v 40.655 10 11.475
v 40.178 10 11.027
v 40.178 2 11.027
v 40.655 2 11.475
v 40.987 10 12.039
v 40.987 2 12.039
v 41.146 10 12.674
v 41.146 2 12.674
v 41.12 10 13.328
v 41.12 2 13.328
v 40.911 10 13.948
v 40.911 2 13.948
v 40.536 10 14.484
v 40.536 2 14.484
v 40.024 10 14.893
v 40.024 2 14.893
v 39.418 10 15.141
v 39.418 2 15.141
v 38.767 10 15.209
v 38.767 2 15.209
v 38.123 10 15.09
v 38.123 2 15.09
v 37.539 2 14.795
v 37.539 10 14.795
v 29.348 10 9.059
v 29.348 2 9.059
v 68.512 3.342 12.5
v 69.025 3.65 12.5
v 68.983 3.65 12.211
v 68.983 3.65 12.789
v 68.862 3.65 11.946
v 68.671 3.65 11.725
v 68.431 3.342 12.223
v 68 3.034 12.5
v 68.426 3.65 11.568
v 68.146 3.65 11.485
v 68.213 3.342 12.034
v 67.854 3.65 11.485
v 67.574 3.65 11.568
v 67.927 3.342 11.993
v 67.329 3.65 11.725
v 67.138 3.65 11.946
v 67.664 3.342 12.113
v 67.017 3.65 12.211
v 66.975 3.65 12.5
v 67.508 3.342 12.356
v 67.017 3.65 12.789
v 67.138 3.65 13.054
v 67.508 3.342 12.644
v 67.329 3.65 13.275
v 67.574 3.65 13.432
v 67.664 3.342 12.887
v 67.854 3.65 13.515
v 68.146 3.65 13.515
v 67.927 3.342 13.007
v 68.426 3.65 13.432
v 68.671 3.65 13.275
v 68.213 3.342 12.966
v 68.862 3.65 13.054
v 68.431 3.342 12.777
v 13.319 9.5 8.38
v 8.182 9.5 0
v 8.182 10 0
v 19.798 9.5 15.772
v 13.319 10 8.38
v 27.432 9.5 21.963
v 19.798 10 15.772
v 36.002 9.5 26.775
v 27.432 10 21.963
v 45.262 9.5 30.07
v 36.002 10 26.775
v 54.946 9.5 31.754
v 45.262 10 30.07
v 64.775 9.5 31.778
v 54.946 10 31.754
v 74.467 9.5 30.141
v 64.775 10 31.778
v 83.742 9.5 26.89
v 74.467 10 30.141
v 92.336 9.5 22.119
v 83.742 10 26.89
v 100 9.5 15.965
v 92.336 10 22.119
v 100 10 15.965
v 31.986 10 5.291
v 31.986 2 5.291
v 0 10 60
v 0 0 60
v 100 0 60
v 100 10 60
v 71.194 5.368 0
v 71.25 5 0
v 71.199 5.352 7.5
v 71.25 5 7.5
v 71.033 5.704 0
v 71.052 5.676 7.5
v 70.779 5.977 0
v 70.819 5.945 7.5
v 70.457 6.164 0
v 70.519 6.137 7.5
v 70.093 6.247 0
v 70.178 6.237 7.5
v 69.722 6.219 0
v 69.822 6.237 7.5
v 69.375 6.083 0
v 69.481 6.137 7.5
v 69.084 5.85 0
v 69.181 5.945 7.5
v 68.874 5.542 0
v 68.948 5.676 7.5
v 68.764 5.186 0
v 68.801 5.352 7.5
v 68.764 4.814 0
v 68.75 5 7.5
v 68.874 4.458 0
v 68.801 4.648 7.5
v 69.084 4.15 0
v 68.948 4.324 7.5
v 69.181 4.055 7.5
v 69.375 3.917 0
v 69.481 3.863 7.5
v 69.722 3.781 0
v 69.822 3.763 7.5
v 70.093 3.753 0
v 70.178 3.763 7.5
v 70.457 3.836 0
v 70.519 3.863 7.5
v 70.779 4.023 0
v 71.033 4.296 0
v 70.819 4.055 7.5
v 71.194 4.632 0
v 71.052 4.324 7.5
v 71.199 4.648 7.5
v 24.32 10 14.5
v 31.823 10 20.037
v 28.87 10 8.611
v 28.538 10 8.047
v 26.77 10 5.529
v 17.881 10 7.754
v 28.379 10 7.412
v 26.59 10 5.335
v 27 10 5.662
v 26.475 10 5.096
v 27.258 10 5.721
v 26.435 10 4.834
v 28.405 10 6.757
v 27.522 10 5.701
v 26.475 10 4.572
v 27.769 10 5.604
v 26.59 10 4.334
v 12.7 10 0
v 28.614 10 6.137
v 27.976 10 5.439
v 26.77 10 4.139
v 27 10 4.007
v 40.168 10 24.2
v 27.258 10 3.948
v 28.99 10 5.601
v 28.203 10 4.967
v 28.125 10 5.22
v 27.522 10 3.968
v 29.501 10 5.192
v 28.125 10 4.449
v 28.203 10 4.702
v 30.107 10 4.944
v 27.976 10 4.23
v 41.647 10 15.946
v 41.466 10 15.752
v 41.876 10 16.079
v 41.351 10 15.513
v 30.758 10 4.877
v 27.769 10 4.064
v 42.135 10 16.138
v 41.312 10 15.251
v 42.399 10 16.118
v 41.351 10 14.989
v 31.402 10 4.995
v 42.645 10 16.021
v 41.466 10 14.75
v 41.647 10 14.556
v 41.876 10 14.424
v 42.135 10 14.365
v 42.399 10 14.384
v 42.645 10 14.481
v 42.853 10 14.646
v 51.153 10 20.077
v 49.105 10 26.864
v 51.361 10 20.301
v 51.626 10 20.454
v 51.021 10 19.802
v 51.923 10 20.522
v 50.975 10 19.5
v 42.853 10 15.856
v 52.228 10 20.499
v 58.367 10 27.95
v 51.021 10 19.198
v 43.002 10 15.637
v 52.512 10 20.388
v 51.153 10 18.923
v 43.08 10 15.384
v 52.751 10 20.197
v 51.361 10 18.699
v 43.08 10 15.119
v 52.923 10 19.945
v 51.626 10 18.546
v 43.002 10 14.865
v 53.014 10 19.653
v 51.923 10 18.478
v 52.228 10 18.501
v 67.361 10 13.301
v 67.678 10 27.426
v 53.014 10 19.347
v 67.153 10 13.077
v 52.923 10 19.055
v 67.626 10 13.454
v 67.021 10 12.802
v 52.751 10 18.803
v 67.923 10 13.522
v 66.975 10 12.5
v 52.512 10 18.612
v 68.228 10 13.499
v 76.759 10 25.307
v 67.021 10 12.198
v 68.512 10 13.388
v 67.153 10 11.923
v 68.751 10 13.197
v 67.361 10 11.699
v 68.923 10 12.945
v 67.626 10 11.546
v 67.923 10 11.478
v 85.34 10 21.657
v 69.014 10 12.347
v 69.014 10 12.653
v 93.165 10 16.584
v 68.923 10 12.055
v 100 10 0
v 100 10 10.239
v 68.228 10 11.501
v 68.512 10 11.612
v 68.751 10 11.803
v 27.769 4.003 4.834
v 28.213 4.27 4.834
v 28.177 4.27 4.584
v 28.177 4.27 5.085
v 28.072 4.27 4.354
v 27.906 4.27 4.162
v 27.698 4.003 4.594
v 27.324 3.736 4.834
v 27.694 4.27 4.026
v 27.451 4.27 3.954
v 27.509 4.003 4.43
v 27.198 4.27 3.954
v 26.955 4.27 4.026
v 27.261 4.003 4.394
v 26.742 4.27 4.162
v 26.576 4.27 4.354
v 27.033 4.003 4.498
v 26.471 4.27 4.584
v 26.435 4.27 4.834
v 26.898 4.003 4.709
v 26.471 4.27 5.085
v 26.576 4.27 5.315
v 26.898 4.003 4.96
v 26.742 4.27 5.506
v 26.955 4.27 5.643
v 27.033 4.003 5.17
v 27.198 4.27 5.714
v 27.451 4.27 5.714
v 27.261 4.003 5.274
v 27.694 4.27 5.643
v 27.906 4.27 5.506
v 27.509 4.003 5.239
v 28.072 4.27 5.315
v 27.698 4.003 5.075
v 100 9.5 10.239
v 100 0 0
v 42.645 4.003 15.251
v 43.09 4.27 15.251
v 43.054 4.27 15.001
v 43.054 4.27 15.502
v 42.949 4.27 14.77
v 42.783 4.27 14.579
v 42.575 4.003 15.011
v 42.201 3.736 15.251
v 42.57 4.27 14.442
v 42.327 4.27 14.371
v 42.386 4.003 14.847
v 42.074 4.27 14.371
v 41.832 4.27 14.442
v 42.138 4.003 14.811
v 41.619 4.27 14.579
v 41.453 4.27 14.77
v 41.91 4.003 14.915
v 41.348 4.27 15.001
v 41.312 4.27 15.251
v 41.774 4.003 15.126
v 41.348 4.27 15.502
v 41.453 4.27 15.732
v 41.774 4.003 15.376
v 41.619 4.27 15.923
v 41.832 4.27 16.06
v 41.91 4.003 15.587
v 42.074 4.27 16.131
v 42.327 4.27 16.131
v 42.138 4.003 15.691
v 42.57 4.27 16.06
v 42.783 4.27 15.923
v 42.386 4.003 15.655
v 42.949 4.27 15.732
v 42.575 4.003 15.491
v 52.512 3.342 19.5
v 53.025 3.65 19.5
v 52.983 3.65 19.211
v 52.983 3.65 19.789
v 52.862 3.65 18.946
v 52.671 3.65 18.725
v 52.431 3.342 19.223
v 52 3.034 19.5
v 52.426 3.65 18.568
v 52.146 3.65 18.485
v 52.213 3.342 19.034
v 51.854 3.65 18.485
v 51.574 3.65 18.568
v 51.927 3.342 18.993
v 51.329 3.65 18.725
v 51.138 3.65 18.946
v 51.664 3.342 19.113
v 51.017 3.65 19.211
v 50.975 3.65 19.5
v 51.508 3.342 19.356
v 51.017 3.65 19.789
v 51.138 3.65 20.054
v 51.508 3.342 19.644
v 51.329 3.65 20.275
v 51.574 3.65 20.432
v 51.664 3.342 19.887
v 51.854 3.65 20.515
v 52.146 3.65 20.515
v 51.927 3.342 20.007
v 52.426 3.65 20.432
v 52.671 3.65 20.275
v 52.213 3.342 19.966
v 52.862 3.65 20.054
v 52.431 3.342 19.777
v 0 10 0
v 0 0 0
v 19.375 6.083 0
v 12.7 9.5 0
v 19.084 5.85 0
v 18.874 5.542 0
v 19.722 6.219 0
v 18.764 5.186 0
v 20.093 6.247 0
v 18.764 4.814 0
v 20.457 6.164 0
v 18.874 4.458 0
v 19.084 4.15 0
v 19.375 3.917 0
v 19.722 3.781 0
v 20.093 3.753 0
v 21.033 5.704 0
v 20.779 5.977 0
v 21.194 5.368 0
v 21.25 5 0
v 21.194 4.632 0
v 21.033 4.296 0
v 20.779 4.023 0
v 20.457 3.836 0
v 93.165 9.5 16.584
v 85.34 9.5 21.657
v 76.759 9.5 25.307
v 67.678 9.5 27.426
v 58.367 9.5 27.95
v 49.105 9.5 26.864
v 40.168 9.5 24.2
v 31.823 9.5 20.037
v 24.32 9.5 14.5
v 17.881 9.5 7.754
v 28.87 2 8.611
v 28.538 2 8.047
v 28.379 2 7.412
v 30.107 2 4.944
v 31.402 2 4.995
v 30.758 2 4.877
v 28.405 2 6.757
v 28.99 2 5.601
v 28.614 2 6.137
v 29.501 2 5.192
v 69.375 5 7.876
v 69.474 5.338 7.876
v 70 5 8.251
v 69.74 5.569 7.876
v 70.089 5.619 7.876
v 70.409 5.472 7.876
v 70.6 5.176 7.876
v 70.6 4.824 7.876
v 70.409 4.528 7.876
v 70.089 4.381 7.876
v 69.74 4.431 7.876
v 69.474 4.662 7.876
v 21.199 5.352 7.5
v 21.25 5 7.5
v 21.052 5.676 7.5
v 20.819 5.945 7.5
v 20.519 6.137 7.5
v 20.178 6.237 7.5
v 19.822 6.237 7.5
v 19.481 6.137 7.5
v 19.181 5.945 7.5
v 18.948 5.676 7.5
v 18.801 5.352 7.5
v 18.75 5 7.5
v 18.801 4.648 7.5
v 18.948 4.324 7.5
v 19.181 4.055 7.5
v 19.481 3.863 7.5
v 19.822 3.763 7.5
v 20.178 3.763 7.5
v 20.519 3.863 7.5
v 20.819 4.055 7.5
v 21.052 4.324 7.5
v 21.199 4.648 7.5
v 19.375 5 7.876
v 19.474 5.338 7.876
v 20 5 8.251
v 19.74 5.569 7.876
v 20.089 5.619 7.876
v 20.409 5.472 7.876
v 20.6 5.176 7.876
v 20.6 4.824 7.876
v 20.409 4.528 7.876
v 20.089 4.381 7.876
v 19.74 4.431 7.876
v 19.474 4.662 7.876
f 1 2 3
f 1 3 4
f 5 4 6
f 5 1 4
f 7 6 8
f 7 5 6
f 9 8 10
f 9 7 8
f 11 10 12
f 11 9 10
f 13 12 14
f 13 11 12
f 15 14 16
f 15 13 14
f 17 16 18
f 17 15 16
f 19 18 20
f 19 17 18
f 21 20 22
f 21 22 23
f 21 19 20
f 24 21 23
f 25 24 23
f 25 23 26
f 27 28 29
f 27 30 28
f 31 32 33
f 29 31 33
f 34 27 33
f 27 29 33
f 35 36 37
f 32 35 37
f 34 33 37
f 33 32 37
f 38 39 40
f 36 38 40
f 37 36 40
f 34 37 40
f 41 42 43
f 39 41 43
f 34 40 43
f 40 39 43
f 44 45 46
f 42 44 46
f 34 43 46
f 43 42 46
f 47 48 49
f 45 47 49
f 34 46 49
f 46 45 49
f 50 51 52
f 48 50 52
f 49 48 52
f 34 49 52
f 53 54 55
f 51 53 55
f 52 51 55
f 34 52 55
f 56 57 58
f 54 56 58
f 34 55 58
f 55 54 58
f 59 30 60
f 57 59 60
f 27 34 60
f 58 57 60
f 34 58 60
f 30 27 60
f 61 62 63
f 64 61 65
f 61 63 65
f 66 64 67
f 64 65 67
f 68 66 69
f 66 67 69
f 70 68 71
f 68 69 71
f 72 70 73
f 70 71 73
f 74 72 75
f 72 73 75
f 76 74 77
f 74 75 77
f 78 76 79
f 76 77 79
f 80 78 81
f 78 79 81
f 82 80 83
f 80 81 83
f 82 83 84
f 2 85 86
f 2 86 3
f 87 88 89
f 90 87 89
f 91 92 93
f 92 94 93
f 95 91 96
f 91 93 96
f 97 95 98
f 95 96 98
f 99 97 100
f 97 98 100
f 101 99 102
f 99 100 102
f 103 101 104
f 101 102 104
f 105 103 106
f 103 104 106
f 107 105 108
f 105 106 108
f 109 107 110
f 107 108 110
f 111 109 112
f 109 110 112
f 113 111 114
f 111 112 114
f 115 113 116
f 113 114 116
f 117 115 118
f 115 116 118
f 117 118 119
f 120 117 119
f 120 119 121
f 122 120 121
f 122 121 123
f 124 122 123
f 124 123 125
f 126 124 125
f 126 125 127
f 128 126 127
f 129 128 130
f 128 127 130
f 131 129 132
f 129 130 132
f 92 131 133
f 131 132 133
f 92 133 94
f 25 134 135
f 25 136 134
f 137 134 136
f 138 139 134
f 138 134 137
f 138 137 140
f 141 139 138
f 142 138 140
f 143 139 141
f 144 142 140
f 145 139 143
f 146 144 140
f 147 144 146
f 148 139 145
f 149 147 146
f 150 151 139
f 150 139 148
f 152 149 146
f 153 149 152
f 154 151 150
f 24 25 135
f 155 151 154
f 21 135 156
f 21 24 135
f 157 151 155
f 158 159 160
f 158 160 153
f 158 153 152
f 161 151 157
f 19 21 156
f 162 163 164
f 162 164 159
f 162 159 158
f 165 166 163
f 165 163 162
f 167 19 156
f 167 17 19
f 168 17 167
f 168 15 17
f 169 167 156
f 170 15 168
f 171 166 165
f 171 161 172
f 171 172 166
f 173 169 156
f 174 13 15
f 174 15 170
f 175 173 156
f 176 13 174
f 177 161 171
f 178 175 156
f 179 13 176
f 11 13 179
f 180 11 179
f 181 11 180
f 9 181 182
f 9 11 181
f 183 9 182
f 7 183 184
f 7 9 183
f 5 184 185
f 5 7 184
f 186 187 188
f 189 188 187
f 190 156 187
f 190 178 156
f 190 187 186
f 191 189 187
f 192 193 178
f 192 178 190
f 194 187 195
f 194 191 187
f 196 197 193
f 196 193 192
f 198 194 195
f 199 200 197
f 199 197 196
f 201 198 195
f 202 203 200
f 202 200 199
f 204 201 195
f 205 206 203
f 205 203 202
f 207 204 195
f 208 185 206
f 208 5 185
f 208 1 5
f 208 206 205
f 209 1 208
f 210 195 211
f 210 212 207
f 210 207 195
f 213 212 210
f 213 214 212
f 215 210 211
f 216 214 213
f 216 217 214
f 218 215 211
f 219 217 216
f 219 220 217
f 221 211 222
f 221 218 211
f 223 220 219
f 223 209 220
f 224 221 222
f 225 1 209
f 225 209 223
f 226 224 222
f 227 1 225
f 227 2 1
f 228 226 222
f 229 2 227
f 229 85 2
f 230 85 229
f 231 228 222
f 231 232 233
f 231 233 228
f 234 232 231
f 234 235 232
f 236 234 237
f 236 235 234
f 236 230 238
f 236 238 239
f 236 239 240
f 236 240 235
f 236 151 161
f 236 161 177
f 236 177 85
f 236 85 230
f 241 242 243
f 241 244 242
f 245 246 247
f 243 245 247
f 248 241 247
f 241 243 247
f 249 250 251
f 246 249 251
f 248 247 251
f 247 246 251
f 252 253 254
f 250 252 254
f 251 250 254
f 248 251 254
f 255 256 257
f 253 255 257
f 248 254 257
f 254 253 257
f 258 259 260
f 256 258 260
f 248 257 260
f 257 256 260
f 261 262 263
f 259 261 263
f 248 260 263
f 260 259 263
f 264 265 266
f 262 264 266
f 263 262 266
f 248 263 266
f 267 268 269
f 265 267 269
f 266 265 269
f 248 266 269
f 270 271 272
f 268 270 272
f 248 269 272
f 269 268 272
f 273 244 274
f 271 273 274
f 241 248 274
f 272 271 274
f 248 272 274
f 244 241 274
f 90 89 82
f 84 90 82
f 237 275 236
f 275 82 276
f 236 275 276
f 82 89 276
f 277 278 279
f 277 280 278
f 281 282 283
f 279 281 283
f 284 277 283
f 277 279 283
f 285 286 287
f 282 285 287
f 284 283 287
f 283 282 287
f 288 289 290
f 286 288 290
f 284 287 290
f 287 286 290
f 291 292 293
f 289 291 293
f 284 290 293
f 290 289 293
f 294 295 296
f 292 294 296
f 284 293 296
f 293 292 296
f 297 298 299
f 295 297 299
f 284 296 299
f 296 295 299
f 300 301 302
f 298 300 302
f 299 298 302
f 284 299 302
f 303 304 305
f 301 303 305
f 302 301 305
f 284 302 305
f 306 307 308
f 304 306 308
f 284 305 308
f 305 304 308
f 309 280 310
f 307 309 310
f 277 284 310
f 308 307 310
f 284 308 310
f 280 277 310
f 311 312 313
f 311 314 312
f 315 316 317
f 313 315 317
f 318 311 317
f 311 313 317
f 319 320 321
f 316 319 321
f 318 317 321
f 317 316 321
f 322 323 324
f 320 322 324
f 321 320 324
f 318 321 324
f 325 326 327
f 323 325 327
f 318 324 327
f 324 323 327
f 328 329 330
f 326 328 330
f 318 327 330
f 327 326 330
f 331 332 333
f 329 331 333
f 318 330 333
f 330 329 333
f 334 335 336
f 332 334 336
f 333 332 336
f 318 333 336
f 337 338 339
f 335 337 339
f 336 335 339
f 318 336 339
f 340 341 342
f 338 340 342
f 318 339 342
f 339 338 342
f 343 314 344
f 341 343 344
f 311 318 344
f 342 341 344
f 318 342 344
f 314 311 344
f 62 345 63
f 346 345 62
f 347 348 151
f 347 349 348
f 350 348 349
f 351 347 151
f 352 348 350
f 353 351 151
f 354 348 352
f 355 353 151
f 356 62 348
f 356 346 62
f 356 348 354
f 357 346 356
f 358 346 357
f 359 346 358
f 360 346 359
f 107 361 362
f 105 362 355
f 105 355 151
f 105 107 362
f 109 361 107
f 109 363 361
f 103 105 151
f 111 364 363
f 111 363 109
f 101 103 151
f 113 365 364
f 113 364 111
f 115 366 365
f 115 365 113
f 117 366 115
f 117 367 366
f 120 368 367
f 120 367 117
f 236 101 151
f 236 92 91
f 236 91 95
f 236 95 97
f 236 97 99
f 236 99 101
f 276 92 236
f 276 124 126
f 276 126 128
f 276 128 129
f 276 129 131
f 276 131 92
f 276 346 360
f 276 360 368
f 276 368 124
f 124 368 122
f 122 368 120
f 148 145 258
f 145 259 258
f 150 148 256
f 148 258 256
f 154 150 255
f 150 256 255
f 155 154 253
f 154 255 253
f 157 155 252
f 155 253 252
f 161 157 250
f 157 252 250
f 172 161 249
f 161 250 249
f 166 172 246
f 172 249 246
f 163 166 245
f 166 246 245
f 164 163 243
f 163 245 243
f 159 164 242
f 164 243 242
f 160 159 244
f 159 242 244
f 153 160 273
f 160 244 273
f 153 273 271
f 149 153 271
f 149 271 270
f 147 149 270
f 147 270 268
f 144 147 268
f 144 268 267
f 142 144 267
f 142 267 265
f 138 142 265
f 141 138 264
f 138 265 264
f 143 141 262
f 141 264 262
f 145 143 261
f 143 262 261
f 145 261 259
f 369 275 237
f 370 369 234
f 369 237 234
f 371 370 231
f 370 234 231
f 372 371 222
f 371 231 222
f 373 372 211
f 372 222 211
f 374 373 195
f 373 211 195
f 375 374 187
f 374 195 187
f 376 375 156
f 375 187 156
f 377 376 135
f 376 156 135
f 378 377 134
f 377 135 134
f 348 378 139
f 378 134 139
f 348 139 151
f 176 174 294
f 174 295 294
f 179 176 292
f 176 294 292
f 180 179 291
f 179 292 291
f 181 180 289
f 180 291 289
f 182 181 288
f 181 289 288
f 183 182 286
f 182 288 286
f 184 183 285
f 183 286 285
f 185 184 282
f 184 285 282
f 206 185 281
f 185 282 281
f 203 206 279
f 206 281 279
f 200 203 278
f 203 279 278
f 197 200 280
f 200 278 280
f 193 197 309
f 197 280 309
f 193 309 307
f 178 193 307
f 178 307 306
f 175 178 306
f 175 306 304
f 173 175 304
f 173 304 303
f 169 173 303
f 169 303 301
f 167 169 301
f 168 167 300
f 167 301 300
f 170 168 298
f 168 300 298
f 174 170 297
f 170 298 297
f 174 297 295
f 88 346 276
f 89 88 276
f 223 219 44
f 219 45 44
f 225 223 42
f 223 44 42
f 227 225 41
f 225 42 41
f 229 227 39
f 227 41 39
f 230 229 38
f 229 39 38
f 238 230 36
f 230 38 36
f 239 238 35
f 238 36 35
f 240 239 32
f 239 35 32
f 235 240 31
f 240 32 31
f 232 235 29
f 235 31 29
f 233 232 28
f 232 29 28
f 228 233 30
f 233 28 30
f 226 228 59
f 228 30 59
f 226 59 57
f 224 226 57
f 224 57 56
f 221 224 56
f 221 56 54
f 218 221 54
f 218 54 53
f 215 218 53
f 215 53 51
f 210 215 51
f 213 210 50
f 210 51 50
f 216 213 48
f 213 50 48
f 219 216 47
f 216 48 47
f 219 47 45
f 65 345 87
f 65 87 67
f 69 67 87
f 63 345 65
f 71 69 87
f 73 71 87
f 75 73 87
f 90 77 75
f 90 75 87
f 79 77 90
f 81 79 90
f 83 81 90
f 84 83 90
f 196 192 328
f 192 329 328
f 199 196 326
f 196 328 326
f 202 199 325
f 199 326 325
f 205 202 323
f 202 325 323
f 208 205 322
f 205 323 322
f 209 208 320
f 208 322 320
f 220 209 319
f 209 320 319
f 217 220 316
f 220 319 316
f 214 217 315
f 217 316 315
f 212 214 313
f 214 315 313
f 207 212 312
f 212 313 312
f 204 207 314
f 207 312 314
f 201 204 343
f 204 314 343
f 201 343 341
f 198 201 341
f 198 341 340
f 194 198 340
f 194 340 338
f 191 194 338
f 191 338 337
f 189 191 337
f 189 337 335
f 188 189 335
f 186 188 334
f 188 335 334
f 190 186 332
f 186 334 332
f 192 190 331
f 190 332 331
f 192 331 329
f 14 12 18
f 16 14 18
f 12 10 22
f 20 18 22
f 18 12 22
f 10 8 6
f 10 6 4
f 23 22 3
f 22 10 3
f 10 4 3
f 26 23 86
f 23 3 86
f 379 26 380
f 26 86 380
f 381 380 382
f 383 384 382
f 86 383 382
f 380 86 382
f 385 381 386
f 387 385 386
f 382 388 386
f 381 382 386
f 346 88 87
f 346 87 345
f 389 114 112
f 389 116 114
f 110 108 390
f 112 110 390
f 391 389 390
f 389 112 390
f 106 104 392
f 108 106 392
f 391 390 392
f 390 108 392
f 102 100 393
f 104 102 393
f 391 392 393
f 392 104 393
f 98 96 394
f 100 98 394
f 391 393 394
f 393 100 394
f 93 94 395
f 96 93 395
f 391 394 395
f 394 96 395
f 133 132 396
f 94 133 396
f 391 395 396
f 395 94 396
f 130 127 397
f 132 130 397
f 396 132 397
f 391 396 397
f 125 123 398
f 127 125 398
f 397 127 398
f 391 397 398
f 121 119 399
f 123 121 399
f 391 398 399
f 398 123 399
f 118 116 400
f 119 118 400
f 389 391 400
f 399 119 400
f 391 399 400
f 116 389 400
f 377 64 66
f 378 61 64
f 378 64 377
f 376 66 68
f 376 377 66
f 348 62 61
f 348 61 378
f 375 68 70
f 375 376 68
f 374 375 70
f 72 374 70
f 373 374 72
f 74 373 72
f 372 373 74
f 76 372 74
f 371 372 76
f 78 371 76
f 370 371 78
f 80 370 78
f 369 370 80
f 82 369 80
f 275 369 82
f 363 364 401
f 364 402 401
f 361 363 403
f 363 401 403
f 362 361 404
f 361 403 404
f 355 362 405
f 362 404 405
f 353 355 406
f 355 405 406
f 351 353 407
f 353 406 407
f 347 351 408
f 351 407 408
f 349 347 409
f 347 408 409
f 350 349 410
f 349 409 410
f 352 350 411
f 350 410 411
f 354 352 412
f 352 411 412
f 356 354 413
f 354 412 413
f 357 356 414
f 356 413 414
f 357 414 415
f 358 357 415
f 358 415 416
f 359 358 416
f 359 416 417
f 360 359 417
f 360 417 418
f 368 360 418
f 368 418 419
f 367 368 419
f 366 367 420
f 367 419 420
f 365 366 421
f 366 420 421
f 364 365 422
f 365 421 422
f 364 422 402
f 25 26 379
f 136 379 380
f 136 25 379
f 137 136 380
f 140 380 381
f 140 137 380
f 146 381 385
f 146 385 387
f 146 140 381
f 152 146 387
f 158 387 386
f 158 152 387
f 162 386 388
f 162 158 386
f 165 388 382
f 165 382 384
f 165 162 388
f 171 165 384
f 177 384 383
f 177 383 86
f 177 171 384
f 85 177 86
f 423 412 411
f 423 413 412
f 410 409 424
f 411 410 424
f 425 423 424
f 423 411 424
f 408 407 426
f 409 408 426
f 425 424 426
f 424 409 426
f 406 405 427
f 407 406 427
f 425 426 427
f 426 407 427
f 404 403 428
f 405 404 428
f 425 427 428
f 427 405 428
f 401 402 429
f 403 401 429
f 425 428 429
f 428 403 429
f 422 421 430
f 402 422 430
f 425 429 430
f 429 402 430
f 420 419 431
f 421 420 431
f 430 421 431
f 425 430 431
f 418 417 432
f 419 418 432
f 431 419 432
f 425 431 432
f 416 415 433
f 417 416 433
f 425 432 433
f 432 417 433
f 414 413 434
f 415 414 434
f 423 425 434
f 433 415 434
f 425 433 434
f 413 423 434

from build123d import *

# Parameters (mm, degrees)
SKETCH1_W                    = 100
SKETCH1_H                    = 60
BOSS_EXTRUDE1_DEPTH          = 10
M2_5X0_45_TAPPED_HOLE1_D     = 2.05
M2_5X0_45_TAPPED_HOLE1_DEPTH = 6.35
M2_5X0_45_TAPPED_HOLE1_TIP   = 0.615882135
F_2_56_TAPPED_HOLE1_D        = 1.778
F_2_56_TAPPED_HOLE1_DEPTH    = 5.73
F_2_56_TAPPED_HOLE1_TIP      = 0.53416509
CUT_EXTRUDE2_DEPTH           = 8
M3X0_5_TAPPED_HOLE2_D        = 2.5
M3X0_5_TAPPED_HOLE2_DEPTH    = 7.5
M3X0_5_TAPPED_HOLE2_TIP      = 0.751075774
CUT_EXTRUDE3_DEPTH           = 0.5


with BuildPart() as part:
    # Sketch1 → Boss-Extrude1 (new body)
    with BuildSketch(Plane(origin=(0, 0, 0), x_dir=(1, 0, 0), z_dir=(0, 1, 0))):
        with Locations((50, -30)):
            Rectangle(SKETCH1_W, SKETCH1_H)
    extrude(amount=BOSS_EXTRUDE1_DEPTH)

    # M2.5x0.45 Tapped Hole1
    with Locations(Plane(origin=(0, 10, 0), x_dir=(1, 0, 0), z_dir=(0, 1, 0))):
        with Locations((52, -19.5), (68, -12.5)):
            Hole(M2_5X0_45_TAPPED_HOLE1_D / 2, depth=M2_5X0_45_TAPPED_HOLE1_DEPTH)
            with Locations((0, 0, -(M2_5X0_45_TAPPED_HOLE1_DEPTH + M2_5X0_45_TAPPED_HOLE1_TIP / 2))):  # 118° drill point
                Cone(0, M2_5X0_45_TAPPED_HOLE1_D / 2, M2_5X0_45_TAPPED_HOLE1_TIP, mode=Mode.SUBTRACT)

    # #2-56 Tapped Hole1
    with Locations(Plane(origin=(0, 10, 0), x_dir=(1, 0, 0), z_dir=(0, 1, 0))):
        with Locations((42.200946939, -15.251050779), (27.324326662, -4.834329118)):
            Hole(F_2_56_TAPPED_HOLE1_D / 2, depth=F_2_56_TAPPED_HOLE1_DEPTH)
            with Locations((0, 0, -(F_2_56_TAPPED_HOLE1_DEPTH + F_2_56_TAPPED_HOLE1_TIP / 2))):  # 118° drill point
                Cone(0, F_2_56_TAPPED_HOLE1_D / 2, F_2_56_TAPPED_HOLE1_TIP, mode=Mode.SUBTRACT)

    # Sketch6 → Cut-Extrude2 (cut)
    with BuildSketch(Plane(origin=(0, 10, 0), x_dir=(1, 0, 0), z_dir=(0, 1, 0))):
        with BuildLine():
            Line((37.539171218, -14.794621832), (29.347650776, -9.058857469))
            ThreePointArc((29.347650776, -9.058857469), (28.782826877, -5.855581963), (31.986102383, -5.290758065))
            Line((31.986102383, -5.290758065), (40.177622826, -11.026522429))
            ThreePointArc((40.177622826, -11.026522429), (40.742446724, -14.229797934), (37.539171218, -14.794621832))
        make_face()
    extrude(amount=-CUT_EXTRUDE2_DEPTH, mode=Mode.SUBTRACT)

    # M3x0.5 Tapped Hole2
    with Locations(Plane(origin=(0, 0, 0), x_dir=(-1, 0, 0), z_dir=(0, 0, -1))):
        with Locations((-20, 5), (-70, 5)):
            Hole(M3X0_5_TAPPED_HOLE2_D / 2, depth=M3X0_5_TAPPED_HOLE2_DEPTH)
            with Locations((0, 0, -(M3X0_5_TAPPED_HOLE2_DEPTH + M3X0_5_TAPPED_HOLE2_TIP / 2))):  # 118° drill point
                Cone(0, M3X0_5_TAPPED_HOLE2_D / 2, M3X0_5_TAPPED_HOLE2_TIP, mode=Mode.SUBTRACT)

    # Sketch12 → Cut-Extrude3 (cut)
    with BuildSketch(Plane(origin=(0, 10, 0), x_dir=(1, 0, 0), z_dir=(0, 1, 0))):
        with BuildLine():
            ThreePointArc((100, -10.239489856), (52.707108631, -27.480037028), (11.757236622, 1.793876671))
            ThreePointArc((11.757236622, 1.793876671), (9.072701681, 2.684534941), (8.182043412, 0))
            ThreePointArc((8.182043412, 0), (52.166644241, -31.443356122), (102.96433534, -12.925139868))
            ThreePointArc((102.96433534, -12.925139868), (102.824992676, -10.100147192), (100, -10.239489856))
        make_face()
    extrude(amount=-CUT_EXTRUDE3_DEPTH, mode=Mode.SUBTRACT)


solid = part.part
